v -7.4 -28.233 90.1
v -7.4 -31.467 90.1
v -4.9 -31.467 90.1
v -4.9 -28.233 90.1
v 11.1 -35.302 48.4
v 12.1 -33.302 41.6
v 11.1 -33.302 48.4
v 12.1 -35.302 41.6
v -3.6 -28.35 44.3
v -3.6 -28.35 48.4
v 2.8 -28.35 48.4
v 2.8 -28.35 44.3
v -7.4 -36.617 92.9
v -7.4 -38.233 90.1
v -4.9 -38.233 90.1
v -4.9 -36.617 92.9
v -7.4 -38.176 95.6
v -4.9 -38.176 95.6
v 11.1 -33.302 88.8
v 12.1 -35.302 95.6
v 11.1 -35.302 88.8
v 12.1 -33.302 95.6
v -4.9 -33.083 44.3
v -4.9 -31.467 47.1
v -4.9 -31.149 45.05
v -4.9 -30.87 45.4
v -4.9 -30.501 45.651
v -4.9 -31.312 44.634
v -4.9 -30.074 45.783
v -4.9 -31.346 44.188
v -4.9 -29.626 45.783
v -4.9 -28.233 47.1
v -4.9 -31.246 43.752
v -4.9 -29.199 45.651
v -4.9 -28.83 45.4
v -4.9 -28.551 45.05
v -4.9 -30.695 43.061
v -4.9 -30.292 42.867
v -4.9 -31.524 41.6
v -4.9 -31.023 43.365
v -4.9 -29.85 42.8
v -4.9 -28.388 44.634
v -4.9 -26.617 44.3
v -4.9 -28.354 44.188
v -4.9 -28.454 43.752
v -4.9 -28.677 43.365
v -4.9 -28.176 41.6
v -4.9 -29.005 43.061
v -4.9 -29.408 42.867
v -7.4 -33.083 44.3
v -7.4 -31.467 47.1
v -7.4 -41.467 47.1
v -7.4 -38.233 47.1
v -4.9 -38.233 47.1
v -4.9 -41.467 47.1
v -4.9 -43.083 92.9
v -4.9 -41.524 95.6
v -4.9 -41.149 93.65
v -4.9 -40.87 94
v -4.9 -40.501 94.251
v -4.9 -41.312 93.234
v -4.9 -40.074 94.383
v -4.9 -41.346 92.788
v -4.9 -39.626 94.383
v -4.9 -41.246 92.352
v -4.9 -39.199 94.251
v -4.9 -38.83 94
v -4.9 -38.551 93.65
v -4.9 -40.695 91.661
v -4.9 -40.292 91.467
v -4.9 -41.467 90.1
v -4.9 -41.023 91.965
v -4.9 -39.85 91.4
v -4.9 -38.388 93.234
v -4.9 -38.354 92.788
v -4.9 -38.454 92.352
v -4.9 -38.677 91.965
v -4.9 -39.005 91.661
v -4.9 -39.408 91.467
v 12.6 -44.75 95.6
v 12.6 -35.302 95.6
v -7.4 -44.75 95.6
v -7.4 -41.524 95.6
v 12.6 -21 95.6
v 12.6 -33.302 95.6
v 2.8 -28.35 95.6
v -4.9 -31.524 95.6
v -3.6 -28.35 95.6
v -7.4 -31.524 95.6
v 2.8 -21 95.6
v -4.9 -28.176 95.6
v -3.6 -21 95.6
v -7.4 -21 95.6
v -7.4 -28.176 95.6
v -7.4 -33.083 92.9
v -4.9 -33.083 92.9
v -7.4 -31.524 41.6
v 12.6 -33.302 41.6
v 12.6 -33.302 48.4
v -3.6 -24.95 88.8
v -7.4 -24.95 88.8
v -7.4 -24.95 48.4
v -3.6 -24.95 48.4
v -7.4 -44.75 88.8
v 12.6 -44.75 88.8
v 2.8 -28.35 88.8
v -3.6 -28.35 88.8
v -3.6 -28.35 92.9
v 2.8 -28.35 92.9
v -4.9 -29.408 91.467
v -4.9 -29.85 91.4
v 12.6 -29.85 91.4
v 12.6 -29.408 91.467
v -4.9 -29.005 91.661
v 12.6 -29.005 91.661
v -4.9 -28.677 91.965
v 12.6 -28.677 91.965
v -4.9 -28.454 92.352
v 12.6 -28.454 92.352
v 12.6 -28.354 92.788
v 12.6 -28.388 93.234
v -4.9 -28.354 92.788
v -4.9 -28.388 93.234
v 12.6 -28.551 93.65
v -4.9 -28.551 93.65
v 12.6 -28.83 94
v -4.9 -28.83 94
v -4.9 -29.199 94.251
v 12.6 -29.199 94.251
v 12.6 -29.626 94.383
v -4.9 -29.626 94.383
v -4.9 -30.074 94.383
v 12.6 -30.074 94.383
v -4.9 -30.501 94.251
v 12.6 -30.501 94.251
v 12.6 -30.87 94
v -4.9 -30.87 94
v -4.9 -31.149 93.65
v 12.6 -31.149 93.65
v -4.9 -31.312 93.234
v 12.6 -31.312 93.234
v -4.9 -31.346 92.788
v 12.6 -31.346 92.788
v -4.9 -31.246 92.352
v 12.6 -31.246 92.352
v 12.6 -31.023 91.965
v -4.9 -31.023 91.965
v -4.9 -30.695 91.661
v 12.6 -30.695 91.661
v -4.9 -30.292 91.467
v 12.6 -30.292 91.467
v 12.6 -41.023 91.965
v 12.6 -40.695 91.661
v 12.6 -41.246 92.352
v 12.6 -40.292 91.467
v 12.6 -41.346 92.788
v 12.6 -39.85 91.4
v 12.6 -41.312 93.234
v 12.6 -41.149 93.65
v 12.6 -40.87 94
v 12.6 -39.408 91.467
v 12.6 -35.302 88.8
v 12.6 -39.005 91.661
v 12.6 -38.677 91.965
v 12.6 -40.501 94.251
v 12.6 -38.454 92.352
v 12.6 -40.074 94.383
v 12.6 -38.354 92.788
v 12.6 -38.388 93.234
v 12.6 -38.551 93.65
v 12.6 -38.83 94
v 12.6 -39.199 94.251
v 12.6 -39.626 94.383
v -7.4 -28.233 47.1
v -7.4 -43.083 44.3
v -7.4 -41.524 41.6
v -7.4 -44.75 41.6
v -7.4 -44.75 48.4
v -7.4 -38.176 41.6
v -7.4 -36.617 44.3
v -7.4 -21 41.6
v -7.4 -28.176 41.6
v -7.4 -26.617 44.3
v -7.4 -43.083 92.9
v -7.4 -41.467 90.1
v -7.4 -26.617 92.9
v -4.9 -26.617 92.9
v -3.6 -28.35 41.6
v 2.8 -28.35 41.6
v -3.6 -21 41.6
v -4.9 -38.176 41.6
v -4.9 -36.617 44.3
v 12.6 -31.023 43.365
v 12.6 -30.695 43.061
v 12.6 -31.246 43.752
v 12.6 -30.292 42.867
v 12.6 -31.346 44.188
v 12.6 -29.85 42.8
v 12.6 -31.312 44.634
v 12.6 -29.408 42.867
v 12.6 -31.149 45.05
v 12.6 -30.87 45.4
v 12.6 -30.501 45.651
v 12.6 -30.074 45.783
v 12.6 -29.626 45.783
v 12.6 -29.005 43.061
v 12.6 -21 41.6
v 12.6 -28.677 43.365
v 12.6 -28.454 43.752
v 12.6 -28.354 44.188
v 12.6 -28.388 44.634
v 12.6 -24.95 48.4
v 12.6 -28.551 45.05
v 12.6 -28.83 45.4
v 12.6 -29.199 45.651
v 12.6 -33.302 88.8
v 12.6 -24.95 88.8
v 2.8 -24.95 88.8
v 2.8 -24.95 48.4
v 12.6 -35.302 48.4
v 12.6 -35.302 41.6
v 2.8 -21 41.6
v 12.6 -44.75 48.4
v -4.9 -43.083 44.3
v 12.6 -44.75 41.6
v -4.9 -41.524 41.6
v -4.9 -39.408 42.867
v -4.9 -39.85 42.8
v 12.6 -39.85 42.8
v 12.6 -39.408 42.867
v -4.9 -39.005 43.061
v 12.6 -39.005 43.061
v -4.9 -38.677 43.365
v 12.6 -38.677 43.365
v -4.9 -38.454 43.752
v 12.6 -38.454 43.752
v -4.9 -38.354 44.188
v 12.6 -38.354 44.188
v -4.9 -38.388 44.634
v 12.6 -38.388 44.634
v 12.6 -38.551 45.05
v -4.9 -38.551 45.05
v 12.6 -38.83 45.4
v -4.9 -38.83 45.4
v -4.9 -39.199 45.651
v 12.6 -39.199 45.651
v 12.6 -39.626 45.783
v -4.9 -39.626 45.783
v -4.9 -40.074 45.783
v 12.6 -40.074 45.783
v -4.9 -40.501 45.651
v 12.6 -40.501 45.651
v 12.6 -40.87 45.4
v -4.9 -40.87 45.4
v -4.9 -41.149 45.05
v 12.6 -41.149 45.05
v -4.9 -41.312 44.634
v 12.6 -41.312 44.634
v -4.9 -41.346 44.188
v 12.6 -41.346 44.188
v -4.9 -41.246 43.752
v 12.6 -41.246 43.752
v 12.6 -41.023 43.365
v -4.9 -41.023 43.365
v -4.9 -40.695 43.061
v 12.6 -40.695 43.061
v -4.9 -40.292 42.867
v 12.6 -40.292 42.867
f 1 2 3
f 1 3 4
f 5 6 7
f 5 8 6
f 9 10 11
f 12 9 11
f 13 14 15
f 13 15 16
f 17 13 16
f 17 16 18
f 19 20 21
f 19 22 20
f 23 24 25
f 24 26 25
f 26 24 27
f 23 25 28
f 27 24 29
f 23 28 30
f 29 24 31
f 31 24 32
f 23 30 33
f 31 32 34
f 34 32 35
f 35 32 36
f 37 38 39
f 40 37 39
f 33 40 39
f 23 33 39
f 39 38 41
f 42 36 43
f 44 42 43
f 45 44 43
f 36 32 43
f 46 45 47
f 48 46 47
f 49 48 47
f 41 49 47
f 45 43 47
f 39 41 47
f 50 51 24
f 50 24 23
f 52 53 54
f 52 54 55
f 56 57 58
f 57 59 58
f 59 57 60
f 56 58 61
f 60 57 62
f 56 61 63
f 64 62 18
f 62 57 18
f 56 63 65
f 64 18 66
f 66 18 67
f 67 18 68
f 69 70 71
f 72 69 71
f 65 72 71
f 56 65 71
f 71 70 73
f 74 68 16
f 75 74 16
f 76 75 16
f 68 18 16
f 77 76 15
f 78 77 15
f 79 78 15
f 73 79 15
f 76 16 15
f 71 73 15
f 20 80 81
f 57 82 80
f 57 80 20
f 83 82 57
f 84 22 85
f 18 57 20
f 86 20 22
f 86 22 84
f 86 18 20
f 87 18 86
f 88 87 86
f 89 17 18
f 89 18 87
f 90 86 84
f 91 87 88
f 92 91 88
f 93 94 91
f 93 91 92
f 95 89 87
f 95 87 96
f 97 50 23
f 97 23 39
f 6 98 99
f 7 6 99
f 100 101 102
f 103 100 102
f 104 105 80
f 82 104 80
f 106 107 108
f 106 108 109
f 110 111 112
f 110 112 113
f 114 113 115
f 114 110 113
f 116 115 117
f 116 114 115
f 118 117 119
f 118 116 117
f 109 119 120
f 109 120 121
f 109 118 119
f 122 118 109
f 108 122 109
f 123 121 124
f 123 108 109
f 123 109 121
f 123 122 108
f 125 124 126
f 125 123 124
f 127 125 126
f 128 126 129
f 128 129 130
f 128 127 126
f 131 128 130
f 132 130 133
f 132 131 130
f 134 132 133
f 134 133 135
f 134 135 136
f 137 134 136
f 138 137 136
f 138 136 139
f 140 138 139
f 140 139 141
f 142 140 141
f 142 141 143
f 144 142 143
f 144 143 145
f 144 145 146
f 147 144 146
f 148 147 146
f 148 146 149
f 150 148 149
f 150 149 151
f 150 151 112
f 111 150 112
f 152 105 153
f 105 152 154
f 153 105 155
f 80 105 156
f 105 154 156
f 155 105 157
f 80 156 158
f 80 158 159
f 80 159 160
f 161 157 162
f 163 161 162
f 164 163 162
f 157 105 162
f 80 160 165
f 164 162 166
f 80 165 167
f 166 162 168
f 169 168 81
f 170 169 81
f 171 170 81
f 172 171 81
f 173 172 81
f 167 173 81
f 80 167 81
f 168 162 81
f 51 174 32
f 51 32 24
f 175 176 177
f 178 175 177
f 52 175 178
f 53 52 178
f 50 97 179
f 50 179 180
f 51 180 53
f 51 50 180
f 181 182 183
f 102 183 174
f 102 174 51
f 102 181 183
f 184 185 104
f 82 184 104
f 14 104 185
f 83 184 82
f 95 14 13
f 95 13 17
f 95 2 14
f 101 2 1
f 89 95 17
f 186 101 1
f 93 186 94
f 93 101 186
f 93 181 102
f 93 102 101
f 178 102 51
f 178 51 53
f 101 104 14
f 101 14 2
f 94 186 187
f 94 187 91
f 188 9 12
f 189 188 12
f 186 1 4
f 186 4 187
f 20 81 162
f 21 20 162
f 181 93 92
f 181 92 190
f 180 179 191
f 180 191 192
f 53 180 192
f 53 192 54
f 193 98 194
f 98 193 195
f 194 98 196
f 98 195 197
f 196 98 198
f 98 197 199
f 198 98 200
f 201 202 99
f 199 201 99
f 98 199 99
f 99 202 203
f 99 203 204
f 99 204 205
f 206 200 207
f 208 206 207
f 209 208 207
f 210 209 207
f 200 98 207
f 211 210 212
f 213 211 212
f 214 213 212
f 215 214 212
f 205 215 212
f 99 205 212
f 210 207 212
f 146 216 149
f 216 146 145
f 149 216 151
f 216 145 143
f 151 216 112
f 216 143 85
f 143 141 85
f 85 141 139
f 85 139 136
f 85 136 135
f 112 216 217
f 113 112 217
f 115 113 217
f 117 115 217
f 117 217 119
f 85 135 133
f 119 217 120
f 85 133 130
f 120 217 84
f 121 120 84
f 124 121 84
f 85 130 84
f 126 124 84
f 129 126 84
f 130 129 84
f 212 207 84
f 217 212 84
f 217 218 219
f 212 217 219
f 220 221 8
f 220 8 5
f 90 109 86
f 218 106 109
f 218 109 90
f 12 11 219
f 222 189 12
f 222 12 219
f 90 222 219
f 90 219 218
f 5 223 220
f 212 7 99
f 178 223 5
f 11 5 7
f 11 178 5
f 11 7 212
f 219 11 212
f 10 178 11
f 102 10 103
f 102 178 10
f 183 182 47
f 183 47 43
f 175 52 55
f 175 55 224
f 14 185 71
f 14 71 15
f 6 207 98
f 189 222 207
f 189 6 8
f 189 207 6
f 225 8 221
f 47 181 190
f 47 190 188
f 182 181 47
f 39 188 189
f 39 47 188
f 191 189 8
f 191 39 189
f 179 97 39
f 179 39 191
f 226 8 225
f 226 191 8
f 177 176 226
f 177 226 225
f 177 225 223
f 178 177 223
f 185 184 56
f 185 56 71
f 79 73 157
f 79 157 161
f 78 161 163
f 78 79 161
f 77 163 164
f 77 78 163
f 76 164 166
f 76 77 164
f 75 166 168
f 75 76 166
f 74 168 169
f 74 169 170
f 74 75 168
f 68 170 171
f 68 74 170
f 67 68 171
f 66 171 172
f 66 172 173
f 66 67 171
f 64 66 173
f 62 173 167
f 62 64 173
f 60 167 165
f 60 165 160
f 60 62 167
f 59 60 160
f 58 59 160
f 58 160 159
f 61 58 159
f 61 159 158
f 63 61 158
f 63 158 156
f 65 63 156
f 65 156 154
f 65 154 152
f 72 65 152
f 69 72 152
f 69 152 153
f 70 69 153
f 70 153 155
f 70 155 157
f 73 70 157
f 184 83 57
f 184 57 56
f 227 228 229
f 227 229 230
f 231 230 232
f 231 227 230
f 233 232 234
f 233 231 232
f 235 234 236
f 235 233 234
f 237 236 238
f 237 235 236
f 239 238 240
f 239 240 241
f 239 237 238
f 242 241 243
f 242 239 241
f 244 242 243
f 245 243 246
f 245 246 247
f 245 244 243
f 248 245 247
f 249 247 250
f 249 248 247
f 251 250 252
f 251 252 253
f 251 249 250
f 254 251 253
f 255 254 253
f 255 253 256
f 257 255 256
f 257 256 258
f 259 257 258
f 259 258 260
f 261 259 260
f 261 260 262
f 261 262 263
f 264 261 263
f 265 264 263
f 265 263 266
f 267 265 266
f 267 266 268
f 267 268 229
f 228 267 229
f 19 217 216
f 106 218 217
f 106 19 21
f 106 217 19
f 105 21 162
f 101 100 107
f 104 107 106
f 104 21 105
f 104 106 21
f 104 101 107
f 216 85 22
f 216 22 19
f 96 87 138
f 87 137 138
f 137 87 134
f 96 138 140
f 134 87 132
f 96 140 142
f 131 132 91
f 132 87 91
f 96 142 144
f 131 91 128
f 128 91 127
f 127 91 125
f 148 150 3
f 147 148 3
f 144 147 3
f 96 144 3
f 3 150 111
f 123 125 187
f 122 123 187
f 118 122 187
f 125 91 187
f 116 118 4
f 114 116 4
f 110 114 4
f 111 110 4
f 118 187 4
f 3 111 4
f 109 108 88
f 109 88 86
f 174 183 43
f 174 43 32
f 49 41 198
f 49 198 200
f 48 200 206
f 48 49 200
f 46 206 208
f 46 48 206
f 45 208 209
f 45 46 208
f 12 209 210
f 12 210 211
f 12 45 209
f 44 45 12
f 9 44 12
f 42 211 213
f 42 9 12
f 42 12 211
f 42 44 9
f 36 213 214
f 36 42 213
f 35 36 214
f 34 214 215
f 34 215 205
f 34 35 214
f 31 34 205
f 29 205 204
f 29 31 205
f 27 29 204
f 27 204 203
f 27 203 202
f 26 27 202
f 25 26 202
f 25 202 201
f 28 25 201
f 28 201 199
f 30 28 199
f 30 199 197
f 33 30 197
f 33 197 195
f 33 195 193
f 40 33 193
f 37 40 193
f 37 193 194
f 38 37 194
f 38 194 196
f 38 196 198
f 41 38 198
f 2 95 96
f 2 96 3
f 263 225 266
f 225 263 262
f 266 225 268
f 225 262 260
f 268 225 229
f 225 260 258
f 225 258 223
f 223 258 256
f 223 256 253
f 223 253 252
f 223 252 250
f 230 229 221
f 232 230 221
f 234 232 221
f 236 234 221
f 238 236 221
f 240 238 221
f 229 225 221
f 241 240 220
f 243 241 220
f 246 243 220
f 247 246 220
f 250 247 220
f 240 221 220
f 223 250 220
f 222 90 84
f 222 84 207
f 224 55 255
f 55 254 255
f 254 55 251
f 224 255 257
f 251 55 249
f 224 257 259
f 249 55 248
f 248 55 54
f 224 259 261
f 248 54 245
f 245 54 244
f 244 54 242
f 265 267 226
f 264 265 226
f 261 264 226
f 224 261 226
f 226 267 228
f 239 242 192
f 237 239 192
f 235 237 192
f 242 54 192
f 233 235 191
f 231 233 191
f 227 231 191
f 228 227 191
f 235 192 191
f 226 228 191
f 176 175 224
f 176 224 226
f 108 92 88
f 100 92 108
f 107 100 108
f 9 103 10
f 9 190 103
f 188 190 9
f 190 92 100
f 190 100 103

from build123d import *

# Parameters (mm, degrees)
SKETCH050_R             = 1.5
PAD021_DEPTH            = 20
POCKET001_DEPTH         = 27.001
POCKET001_DEPTH_BACK    = 27.001
POCKET032_DEPTH         = 1
POCKET033_DEPTH         = 2.5
SKETCH008_W             = 54
SKETCH008_H             = 1.25
POCKET003_DEPTH         = 0.001
POCKET003_DEPTH_BACK    = 20.001
BODY009_PITCH_ANGLE     = 90
BODY009_PLACEMENT_ANGLE = 90


with BuildPart() as part:
    # Sketch050 → Pad021 (new body)
    with BuildSketch(Plane.XZ):
        Polygon((-27, 25), (27, 25), (27, 0), (20.2, 0), (20.2, 19.8), (20, 19.8), (-20, 19.8), (-20.2, 19.8), (-20.2, 0), (-27, 0), align=None)
        with Locations((24.3, 14.9)):
            Circle(SKETCH050_R, mode=Mode.SUBTRACT)
        with Locations((24.3, 4.9)):
            Circle(SKETCH050_R, mode=Mode.SUBTRACT)
        with Locations((-24.3, 14.9)):
            Circle(SKETCH050_R, mode=Mode.SUBTRACT)
        with Locations((-24.3, 4.9)):
            Circle(SKETCH050_R, mode=Mode.SUBTRACT)
    extrude(amount=PAD021_DEPTH)

    # Sketch007 → Pocket001 (cut, two sides)
    with BuildSketch(Plane.YZ) as pocket001_sk:
        Polygon((-10.2, 16.4), (-10.2, 23.75), (-7.25, 23.75), (-6.749999, 23.75), (-3.8, 23.75), (-3.8, 16.4), align=None)
    extrude(amount=-POCKET001_DEPTH, mode=Mode.SUBTRACT)
    extrude(pocket001_sk.sketch, amount=POCKET001_DEPTH_BACK, mode=Mode.SUBTRACT)

    # Sketch003 → Pocket032 (cut, symmetric)
    with BuildSketch(Plane(origin=(0, -23.75, 10.448022), x_dir=(1, 0, 0), z_dir=(0, 0, -1))):
        Polygon((-20.2, -3.75), (-27, -3.75), (-27, -4.25), (-20.2, -5.25), align=None)
        Polygon((20.2, -3.75), (27, -3.75), (27, -4.25), (20.2, -5.25), align=None)
    extrude(amount=POCKET032_DEPTH, both=True, mode=Mode.SUBTRACT)

    # Sketch051 → Pocket033 (cut)
    with BuildSketch(Plane.XZ):
        Polygon((-27.1, 16.516581), (-27.1, 13.283419), (-24.3, 11.666838), (-21.5, 13.283419), (-21.5, 16.516581), (-24.3, 18.133162), align=None)
        Polygon((-27.1, 6.516581), (-27.1, 3.283419), (-24.3, 1.666838), (-21.5, 3.283419), (-21.5, 6.516581), (-24.3, 8.133162), align=None)
        Polygon((21.5, 16.516581), (21.5, 13.283419), (24.3, 11.666838), (27.1, 13.283419), (27.1, 16.516581), (24.3, 18.133162), align=None)
        Polygon((21.5, 6.516581), (21.5, 3.283419), (24.3, 1.666838), (27.1, 3.283419), (27.1, 6.516581), (24.3, 8.133162), align=None)
    extrude(amount=POCKET033_DEPTH, mode=Mode.SUBTRACT)

    # Sketch008 → Pocket003 (cut, two sides)
    with BuildSketch(Plane.XZ) as pocket003_sk:
        with Locations((0, 24.375)):
            Rectangle(SKETCH008_W, SKETCH008_H)
    extrude(amount=-POCKET003_DEPTH, mode=Mode.SUBTRACT)
    extrude(pocket003_sk.sketch, amount=POCKET003_DEPTH_BACK, mode=Mode.SUBTRACT)


with BuildPart() as part_1:
    # Body009 pitch: moved
    add(part.part.rotate(Axis((0, 0, 0), (0, 1, 0)), BODY009_PITCH_ANGLE))


with BuildPart() as part_2:
    # Body009 placement: moved
    add(part_1.part.moved(Location((-7.4, -44.75, 68.6))).rotate(Axis((-7.4, -44.75, 68.6), (0, 0, 1)), BODY009_PLACEMENT_ANGLE))


solid = part_2.part
